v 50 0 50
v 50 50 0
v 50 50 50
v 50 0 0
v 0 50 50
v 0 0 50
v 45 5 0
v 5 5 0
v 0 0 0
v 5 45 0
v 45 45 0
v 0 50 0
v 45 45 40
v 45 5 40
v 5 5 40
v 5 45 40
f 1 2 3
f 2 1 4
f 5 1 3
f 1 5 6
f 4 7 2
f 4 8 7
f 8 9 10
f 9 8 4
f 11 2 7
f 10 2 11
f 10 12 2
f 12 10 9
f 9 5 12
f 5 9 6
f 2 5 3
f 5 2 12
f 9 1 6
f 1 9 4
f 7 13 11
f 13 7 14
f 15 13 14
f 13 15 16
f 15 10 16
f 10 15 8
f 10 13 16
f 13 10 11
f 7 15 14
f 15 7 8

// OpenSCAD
$fn = 50;


module base(x, y, z, t) {
//minkowski() {
    difference() {
        cube([x, y, z]);
        translate([t / 2, t / 2, 0]) cube(x - t, y - t, z - t);
    }
//    cylinder(2, 50);
//    }
}

base(50, 50, 50, 10);
